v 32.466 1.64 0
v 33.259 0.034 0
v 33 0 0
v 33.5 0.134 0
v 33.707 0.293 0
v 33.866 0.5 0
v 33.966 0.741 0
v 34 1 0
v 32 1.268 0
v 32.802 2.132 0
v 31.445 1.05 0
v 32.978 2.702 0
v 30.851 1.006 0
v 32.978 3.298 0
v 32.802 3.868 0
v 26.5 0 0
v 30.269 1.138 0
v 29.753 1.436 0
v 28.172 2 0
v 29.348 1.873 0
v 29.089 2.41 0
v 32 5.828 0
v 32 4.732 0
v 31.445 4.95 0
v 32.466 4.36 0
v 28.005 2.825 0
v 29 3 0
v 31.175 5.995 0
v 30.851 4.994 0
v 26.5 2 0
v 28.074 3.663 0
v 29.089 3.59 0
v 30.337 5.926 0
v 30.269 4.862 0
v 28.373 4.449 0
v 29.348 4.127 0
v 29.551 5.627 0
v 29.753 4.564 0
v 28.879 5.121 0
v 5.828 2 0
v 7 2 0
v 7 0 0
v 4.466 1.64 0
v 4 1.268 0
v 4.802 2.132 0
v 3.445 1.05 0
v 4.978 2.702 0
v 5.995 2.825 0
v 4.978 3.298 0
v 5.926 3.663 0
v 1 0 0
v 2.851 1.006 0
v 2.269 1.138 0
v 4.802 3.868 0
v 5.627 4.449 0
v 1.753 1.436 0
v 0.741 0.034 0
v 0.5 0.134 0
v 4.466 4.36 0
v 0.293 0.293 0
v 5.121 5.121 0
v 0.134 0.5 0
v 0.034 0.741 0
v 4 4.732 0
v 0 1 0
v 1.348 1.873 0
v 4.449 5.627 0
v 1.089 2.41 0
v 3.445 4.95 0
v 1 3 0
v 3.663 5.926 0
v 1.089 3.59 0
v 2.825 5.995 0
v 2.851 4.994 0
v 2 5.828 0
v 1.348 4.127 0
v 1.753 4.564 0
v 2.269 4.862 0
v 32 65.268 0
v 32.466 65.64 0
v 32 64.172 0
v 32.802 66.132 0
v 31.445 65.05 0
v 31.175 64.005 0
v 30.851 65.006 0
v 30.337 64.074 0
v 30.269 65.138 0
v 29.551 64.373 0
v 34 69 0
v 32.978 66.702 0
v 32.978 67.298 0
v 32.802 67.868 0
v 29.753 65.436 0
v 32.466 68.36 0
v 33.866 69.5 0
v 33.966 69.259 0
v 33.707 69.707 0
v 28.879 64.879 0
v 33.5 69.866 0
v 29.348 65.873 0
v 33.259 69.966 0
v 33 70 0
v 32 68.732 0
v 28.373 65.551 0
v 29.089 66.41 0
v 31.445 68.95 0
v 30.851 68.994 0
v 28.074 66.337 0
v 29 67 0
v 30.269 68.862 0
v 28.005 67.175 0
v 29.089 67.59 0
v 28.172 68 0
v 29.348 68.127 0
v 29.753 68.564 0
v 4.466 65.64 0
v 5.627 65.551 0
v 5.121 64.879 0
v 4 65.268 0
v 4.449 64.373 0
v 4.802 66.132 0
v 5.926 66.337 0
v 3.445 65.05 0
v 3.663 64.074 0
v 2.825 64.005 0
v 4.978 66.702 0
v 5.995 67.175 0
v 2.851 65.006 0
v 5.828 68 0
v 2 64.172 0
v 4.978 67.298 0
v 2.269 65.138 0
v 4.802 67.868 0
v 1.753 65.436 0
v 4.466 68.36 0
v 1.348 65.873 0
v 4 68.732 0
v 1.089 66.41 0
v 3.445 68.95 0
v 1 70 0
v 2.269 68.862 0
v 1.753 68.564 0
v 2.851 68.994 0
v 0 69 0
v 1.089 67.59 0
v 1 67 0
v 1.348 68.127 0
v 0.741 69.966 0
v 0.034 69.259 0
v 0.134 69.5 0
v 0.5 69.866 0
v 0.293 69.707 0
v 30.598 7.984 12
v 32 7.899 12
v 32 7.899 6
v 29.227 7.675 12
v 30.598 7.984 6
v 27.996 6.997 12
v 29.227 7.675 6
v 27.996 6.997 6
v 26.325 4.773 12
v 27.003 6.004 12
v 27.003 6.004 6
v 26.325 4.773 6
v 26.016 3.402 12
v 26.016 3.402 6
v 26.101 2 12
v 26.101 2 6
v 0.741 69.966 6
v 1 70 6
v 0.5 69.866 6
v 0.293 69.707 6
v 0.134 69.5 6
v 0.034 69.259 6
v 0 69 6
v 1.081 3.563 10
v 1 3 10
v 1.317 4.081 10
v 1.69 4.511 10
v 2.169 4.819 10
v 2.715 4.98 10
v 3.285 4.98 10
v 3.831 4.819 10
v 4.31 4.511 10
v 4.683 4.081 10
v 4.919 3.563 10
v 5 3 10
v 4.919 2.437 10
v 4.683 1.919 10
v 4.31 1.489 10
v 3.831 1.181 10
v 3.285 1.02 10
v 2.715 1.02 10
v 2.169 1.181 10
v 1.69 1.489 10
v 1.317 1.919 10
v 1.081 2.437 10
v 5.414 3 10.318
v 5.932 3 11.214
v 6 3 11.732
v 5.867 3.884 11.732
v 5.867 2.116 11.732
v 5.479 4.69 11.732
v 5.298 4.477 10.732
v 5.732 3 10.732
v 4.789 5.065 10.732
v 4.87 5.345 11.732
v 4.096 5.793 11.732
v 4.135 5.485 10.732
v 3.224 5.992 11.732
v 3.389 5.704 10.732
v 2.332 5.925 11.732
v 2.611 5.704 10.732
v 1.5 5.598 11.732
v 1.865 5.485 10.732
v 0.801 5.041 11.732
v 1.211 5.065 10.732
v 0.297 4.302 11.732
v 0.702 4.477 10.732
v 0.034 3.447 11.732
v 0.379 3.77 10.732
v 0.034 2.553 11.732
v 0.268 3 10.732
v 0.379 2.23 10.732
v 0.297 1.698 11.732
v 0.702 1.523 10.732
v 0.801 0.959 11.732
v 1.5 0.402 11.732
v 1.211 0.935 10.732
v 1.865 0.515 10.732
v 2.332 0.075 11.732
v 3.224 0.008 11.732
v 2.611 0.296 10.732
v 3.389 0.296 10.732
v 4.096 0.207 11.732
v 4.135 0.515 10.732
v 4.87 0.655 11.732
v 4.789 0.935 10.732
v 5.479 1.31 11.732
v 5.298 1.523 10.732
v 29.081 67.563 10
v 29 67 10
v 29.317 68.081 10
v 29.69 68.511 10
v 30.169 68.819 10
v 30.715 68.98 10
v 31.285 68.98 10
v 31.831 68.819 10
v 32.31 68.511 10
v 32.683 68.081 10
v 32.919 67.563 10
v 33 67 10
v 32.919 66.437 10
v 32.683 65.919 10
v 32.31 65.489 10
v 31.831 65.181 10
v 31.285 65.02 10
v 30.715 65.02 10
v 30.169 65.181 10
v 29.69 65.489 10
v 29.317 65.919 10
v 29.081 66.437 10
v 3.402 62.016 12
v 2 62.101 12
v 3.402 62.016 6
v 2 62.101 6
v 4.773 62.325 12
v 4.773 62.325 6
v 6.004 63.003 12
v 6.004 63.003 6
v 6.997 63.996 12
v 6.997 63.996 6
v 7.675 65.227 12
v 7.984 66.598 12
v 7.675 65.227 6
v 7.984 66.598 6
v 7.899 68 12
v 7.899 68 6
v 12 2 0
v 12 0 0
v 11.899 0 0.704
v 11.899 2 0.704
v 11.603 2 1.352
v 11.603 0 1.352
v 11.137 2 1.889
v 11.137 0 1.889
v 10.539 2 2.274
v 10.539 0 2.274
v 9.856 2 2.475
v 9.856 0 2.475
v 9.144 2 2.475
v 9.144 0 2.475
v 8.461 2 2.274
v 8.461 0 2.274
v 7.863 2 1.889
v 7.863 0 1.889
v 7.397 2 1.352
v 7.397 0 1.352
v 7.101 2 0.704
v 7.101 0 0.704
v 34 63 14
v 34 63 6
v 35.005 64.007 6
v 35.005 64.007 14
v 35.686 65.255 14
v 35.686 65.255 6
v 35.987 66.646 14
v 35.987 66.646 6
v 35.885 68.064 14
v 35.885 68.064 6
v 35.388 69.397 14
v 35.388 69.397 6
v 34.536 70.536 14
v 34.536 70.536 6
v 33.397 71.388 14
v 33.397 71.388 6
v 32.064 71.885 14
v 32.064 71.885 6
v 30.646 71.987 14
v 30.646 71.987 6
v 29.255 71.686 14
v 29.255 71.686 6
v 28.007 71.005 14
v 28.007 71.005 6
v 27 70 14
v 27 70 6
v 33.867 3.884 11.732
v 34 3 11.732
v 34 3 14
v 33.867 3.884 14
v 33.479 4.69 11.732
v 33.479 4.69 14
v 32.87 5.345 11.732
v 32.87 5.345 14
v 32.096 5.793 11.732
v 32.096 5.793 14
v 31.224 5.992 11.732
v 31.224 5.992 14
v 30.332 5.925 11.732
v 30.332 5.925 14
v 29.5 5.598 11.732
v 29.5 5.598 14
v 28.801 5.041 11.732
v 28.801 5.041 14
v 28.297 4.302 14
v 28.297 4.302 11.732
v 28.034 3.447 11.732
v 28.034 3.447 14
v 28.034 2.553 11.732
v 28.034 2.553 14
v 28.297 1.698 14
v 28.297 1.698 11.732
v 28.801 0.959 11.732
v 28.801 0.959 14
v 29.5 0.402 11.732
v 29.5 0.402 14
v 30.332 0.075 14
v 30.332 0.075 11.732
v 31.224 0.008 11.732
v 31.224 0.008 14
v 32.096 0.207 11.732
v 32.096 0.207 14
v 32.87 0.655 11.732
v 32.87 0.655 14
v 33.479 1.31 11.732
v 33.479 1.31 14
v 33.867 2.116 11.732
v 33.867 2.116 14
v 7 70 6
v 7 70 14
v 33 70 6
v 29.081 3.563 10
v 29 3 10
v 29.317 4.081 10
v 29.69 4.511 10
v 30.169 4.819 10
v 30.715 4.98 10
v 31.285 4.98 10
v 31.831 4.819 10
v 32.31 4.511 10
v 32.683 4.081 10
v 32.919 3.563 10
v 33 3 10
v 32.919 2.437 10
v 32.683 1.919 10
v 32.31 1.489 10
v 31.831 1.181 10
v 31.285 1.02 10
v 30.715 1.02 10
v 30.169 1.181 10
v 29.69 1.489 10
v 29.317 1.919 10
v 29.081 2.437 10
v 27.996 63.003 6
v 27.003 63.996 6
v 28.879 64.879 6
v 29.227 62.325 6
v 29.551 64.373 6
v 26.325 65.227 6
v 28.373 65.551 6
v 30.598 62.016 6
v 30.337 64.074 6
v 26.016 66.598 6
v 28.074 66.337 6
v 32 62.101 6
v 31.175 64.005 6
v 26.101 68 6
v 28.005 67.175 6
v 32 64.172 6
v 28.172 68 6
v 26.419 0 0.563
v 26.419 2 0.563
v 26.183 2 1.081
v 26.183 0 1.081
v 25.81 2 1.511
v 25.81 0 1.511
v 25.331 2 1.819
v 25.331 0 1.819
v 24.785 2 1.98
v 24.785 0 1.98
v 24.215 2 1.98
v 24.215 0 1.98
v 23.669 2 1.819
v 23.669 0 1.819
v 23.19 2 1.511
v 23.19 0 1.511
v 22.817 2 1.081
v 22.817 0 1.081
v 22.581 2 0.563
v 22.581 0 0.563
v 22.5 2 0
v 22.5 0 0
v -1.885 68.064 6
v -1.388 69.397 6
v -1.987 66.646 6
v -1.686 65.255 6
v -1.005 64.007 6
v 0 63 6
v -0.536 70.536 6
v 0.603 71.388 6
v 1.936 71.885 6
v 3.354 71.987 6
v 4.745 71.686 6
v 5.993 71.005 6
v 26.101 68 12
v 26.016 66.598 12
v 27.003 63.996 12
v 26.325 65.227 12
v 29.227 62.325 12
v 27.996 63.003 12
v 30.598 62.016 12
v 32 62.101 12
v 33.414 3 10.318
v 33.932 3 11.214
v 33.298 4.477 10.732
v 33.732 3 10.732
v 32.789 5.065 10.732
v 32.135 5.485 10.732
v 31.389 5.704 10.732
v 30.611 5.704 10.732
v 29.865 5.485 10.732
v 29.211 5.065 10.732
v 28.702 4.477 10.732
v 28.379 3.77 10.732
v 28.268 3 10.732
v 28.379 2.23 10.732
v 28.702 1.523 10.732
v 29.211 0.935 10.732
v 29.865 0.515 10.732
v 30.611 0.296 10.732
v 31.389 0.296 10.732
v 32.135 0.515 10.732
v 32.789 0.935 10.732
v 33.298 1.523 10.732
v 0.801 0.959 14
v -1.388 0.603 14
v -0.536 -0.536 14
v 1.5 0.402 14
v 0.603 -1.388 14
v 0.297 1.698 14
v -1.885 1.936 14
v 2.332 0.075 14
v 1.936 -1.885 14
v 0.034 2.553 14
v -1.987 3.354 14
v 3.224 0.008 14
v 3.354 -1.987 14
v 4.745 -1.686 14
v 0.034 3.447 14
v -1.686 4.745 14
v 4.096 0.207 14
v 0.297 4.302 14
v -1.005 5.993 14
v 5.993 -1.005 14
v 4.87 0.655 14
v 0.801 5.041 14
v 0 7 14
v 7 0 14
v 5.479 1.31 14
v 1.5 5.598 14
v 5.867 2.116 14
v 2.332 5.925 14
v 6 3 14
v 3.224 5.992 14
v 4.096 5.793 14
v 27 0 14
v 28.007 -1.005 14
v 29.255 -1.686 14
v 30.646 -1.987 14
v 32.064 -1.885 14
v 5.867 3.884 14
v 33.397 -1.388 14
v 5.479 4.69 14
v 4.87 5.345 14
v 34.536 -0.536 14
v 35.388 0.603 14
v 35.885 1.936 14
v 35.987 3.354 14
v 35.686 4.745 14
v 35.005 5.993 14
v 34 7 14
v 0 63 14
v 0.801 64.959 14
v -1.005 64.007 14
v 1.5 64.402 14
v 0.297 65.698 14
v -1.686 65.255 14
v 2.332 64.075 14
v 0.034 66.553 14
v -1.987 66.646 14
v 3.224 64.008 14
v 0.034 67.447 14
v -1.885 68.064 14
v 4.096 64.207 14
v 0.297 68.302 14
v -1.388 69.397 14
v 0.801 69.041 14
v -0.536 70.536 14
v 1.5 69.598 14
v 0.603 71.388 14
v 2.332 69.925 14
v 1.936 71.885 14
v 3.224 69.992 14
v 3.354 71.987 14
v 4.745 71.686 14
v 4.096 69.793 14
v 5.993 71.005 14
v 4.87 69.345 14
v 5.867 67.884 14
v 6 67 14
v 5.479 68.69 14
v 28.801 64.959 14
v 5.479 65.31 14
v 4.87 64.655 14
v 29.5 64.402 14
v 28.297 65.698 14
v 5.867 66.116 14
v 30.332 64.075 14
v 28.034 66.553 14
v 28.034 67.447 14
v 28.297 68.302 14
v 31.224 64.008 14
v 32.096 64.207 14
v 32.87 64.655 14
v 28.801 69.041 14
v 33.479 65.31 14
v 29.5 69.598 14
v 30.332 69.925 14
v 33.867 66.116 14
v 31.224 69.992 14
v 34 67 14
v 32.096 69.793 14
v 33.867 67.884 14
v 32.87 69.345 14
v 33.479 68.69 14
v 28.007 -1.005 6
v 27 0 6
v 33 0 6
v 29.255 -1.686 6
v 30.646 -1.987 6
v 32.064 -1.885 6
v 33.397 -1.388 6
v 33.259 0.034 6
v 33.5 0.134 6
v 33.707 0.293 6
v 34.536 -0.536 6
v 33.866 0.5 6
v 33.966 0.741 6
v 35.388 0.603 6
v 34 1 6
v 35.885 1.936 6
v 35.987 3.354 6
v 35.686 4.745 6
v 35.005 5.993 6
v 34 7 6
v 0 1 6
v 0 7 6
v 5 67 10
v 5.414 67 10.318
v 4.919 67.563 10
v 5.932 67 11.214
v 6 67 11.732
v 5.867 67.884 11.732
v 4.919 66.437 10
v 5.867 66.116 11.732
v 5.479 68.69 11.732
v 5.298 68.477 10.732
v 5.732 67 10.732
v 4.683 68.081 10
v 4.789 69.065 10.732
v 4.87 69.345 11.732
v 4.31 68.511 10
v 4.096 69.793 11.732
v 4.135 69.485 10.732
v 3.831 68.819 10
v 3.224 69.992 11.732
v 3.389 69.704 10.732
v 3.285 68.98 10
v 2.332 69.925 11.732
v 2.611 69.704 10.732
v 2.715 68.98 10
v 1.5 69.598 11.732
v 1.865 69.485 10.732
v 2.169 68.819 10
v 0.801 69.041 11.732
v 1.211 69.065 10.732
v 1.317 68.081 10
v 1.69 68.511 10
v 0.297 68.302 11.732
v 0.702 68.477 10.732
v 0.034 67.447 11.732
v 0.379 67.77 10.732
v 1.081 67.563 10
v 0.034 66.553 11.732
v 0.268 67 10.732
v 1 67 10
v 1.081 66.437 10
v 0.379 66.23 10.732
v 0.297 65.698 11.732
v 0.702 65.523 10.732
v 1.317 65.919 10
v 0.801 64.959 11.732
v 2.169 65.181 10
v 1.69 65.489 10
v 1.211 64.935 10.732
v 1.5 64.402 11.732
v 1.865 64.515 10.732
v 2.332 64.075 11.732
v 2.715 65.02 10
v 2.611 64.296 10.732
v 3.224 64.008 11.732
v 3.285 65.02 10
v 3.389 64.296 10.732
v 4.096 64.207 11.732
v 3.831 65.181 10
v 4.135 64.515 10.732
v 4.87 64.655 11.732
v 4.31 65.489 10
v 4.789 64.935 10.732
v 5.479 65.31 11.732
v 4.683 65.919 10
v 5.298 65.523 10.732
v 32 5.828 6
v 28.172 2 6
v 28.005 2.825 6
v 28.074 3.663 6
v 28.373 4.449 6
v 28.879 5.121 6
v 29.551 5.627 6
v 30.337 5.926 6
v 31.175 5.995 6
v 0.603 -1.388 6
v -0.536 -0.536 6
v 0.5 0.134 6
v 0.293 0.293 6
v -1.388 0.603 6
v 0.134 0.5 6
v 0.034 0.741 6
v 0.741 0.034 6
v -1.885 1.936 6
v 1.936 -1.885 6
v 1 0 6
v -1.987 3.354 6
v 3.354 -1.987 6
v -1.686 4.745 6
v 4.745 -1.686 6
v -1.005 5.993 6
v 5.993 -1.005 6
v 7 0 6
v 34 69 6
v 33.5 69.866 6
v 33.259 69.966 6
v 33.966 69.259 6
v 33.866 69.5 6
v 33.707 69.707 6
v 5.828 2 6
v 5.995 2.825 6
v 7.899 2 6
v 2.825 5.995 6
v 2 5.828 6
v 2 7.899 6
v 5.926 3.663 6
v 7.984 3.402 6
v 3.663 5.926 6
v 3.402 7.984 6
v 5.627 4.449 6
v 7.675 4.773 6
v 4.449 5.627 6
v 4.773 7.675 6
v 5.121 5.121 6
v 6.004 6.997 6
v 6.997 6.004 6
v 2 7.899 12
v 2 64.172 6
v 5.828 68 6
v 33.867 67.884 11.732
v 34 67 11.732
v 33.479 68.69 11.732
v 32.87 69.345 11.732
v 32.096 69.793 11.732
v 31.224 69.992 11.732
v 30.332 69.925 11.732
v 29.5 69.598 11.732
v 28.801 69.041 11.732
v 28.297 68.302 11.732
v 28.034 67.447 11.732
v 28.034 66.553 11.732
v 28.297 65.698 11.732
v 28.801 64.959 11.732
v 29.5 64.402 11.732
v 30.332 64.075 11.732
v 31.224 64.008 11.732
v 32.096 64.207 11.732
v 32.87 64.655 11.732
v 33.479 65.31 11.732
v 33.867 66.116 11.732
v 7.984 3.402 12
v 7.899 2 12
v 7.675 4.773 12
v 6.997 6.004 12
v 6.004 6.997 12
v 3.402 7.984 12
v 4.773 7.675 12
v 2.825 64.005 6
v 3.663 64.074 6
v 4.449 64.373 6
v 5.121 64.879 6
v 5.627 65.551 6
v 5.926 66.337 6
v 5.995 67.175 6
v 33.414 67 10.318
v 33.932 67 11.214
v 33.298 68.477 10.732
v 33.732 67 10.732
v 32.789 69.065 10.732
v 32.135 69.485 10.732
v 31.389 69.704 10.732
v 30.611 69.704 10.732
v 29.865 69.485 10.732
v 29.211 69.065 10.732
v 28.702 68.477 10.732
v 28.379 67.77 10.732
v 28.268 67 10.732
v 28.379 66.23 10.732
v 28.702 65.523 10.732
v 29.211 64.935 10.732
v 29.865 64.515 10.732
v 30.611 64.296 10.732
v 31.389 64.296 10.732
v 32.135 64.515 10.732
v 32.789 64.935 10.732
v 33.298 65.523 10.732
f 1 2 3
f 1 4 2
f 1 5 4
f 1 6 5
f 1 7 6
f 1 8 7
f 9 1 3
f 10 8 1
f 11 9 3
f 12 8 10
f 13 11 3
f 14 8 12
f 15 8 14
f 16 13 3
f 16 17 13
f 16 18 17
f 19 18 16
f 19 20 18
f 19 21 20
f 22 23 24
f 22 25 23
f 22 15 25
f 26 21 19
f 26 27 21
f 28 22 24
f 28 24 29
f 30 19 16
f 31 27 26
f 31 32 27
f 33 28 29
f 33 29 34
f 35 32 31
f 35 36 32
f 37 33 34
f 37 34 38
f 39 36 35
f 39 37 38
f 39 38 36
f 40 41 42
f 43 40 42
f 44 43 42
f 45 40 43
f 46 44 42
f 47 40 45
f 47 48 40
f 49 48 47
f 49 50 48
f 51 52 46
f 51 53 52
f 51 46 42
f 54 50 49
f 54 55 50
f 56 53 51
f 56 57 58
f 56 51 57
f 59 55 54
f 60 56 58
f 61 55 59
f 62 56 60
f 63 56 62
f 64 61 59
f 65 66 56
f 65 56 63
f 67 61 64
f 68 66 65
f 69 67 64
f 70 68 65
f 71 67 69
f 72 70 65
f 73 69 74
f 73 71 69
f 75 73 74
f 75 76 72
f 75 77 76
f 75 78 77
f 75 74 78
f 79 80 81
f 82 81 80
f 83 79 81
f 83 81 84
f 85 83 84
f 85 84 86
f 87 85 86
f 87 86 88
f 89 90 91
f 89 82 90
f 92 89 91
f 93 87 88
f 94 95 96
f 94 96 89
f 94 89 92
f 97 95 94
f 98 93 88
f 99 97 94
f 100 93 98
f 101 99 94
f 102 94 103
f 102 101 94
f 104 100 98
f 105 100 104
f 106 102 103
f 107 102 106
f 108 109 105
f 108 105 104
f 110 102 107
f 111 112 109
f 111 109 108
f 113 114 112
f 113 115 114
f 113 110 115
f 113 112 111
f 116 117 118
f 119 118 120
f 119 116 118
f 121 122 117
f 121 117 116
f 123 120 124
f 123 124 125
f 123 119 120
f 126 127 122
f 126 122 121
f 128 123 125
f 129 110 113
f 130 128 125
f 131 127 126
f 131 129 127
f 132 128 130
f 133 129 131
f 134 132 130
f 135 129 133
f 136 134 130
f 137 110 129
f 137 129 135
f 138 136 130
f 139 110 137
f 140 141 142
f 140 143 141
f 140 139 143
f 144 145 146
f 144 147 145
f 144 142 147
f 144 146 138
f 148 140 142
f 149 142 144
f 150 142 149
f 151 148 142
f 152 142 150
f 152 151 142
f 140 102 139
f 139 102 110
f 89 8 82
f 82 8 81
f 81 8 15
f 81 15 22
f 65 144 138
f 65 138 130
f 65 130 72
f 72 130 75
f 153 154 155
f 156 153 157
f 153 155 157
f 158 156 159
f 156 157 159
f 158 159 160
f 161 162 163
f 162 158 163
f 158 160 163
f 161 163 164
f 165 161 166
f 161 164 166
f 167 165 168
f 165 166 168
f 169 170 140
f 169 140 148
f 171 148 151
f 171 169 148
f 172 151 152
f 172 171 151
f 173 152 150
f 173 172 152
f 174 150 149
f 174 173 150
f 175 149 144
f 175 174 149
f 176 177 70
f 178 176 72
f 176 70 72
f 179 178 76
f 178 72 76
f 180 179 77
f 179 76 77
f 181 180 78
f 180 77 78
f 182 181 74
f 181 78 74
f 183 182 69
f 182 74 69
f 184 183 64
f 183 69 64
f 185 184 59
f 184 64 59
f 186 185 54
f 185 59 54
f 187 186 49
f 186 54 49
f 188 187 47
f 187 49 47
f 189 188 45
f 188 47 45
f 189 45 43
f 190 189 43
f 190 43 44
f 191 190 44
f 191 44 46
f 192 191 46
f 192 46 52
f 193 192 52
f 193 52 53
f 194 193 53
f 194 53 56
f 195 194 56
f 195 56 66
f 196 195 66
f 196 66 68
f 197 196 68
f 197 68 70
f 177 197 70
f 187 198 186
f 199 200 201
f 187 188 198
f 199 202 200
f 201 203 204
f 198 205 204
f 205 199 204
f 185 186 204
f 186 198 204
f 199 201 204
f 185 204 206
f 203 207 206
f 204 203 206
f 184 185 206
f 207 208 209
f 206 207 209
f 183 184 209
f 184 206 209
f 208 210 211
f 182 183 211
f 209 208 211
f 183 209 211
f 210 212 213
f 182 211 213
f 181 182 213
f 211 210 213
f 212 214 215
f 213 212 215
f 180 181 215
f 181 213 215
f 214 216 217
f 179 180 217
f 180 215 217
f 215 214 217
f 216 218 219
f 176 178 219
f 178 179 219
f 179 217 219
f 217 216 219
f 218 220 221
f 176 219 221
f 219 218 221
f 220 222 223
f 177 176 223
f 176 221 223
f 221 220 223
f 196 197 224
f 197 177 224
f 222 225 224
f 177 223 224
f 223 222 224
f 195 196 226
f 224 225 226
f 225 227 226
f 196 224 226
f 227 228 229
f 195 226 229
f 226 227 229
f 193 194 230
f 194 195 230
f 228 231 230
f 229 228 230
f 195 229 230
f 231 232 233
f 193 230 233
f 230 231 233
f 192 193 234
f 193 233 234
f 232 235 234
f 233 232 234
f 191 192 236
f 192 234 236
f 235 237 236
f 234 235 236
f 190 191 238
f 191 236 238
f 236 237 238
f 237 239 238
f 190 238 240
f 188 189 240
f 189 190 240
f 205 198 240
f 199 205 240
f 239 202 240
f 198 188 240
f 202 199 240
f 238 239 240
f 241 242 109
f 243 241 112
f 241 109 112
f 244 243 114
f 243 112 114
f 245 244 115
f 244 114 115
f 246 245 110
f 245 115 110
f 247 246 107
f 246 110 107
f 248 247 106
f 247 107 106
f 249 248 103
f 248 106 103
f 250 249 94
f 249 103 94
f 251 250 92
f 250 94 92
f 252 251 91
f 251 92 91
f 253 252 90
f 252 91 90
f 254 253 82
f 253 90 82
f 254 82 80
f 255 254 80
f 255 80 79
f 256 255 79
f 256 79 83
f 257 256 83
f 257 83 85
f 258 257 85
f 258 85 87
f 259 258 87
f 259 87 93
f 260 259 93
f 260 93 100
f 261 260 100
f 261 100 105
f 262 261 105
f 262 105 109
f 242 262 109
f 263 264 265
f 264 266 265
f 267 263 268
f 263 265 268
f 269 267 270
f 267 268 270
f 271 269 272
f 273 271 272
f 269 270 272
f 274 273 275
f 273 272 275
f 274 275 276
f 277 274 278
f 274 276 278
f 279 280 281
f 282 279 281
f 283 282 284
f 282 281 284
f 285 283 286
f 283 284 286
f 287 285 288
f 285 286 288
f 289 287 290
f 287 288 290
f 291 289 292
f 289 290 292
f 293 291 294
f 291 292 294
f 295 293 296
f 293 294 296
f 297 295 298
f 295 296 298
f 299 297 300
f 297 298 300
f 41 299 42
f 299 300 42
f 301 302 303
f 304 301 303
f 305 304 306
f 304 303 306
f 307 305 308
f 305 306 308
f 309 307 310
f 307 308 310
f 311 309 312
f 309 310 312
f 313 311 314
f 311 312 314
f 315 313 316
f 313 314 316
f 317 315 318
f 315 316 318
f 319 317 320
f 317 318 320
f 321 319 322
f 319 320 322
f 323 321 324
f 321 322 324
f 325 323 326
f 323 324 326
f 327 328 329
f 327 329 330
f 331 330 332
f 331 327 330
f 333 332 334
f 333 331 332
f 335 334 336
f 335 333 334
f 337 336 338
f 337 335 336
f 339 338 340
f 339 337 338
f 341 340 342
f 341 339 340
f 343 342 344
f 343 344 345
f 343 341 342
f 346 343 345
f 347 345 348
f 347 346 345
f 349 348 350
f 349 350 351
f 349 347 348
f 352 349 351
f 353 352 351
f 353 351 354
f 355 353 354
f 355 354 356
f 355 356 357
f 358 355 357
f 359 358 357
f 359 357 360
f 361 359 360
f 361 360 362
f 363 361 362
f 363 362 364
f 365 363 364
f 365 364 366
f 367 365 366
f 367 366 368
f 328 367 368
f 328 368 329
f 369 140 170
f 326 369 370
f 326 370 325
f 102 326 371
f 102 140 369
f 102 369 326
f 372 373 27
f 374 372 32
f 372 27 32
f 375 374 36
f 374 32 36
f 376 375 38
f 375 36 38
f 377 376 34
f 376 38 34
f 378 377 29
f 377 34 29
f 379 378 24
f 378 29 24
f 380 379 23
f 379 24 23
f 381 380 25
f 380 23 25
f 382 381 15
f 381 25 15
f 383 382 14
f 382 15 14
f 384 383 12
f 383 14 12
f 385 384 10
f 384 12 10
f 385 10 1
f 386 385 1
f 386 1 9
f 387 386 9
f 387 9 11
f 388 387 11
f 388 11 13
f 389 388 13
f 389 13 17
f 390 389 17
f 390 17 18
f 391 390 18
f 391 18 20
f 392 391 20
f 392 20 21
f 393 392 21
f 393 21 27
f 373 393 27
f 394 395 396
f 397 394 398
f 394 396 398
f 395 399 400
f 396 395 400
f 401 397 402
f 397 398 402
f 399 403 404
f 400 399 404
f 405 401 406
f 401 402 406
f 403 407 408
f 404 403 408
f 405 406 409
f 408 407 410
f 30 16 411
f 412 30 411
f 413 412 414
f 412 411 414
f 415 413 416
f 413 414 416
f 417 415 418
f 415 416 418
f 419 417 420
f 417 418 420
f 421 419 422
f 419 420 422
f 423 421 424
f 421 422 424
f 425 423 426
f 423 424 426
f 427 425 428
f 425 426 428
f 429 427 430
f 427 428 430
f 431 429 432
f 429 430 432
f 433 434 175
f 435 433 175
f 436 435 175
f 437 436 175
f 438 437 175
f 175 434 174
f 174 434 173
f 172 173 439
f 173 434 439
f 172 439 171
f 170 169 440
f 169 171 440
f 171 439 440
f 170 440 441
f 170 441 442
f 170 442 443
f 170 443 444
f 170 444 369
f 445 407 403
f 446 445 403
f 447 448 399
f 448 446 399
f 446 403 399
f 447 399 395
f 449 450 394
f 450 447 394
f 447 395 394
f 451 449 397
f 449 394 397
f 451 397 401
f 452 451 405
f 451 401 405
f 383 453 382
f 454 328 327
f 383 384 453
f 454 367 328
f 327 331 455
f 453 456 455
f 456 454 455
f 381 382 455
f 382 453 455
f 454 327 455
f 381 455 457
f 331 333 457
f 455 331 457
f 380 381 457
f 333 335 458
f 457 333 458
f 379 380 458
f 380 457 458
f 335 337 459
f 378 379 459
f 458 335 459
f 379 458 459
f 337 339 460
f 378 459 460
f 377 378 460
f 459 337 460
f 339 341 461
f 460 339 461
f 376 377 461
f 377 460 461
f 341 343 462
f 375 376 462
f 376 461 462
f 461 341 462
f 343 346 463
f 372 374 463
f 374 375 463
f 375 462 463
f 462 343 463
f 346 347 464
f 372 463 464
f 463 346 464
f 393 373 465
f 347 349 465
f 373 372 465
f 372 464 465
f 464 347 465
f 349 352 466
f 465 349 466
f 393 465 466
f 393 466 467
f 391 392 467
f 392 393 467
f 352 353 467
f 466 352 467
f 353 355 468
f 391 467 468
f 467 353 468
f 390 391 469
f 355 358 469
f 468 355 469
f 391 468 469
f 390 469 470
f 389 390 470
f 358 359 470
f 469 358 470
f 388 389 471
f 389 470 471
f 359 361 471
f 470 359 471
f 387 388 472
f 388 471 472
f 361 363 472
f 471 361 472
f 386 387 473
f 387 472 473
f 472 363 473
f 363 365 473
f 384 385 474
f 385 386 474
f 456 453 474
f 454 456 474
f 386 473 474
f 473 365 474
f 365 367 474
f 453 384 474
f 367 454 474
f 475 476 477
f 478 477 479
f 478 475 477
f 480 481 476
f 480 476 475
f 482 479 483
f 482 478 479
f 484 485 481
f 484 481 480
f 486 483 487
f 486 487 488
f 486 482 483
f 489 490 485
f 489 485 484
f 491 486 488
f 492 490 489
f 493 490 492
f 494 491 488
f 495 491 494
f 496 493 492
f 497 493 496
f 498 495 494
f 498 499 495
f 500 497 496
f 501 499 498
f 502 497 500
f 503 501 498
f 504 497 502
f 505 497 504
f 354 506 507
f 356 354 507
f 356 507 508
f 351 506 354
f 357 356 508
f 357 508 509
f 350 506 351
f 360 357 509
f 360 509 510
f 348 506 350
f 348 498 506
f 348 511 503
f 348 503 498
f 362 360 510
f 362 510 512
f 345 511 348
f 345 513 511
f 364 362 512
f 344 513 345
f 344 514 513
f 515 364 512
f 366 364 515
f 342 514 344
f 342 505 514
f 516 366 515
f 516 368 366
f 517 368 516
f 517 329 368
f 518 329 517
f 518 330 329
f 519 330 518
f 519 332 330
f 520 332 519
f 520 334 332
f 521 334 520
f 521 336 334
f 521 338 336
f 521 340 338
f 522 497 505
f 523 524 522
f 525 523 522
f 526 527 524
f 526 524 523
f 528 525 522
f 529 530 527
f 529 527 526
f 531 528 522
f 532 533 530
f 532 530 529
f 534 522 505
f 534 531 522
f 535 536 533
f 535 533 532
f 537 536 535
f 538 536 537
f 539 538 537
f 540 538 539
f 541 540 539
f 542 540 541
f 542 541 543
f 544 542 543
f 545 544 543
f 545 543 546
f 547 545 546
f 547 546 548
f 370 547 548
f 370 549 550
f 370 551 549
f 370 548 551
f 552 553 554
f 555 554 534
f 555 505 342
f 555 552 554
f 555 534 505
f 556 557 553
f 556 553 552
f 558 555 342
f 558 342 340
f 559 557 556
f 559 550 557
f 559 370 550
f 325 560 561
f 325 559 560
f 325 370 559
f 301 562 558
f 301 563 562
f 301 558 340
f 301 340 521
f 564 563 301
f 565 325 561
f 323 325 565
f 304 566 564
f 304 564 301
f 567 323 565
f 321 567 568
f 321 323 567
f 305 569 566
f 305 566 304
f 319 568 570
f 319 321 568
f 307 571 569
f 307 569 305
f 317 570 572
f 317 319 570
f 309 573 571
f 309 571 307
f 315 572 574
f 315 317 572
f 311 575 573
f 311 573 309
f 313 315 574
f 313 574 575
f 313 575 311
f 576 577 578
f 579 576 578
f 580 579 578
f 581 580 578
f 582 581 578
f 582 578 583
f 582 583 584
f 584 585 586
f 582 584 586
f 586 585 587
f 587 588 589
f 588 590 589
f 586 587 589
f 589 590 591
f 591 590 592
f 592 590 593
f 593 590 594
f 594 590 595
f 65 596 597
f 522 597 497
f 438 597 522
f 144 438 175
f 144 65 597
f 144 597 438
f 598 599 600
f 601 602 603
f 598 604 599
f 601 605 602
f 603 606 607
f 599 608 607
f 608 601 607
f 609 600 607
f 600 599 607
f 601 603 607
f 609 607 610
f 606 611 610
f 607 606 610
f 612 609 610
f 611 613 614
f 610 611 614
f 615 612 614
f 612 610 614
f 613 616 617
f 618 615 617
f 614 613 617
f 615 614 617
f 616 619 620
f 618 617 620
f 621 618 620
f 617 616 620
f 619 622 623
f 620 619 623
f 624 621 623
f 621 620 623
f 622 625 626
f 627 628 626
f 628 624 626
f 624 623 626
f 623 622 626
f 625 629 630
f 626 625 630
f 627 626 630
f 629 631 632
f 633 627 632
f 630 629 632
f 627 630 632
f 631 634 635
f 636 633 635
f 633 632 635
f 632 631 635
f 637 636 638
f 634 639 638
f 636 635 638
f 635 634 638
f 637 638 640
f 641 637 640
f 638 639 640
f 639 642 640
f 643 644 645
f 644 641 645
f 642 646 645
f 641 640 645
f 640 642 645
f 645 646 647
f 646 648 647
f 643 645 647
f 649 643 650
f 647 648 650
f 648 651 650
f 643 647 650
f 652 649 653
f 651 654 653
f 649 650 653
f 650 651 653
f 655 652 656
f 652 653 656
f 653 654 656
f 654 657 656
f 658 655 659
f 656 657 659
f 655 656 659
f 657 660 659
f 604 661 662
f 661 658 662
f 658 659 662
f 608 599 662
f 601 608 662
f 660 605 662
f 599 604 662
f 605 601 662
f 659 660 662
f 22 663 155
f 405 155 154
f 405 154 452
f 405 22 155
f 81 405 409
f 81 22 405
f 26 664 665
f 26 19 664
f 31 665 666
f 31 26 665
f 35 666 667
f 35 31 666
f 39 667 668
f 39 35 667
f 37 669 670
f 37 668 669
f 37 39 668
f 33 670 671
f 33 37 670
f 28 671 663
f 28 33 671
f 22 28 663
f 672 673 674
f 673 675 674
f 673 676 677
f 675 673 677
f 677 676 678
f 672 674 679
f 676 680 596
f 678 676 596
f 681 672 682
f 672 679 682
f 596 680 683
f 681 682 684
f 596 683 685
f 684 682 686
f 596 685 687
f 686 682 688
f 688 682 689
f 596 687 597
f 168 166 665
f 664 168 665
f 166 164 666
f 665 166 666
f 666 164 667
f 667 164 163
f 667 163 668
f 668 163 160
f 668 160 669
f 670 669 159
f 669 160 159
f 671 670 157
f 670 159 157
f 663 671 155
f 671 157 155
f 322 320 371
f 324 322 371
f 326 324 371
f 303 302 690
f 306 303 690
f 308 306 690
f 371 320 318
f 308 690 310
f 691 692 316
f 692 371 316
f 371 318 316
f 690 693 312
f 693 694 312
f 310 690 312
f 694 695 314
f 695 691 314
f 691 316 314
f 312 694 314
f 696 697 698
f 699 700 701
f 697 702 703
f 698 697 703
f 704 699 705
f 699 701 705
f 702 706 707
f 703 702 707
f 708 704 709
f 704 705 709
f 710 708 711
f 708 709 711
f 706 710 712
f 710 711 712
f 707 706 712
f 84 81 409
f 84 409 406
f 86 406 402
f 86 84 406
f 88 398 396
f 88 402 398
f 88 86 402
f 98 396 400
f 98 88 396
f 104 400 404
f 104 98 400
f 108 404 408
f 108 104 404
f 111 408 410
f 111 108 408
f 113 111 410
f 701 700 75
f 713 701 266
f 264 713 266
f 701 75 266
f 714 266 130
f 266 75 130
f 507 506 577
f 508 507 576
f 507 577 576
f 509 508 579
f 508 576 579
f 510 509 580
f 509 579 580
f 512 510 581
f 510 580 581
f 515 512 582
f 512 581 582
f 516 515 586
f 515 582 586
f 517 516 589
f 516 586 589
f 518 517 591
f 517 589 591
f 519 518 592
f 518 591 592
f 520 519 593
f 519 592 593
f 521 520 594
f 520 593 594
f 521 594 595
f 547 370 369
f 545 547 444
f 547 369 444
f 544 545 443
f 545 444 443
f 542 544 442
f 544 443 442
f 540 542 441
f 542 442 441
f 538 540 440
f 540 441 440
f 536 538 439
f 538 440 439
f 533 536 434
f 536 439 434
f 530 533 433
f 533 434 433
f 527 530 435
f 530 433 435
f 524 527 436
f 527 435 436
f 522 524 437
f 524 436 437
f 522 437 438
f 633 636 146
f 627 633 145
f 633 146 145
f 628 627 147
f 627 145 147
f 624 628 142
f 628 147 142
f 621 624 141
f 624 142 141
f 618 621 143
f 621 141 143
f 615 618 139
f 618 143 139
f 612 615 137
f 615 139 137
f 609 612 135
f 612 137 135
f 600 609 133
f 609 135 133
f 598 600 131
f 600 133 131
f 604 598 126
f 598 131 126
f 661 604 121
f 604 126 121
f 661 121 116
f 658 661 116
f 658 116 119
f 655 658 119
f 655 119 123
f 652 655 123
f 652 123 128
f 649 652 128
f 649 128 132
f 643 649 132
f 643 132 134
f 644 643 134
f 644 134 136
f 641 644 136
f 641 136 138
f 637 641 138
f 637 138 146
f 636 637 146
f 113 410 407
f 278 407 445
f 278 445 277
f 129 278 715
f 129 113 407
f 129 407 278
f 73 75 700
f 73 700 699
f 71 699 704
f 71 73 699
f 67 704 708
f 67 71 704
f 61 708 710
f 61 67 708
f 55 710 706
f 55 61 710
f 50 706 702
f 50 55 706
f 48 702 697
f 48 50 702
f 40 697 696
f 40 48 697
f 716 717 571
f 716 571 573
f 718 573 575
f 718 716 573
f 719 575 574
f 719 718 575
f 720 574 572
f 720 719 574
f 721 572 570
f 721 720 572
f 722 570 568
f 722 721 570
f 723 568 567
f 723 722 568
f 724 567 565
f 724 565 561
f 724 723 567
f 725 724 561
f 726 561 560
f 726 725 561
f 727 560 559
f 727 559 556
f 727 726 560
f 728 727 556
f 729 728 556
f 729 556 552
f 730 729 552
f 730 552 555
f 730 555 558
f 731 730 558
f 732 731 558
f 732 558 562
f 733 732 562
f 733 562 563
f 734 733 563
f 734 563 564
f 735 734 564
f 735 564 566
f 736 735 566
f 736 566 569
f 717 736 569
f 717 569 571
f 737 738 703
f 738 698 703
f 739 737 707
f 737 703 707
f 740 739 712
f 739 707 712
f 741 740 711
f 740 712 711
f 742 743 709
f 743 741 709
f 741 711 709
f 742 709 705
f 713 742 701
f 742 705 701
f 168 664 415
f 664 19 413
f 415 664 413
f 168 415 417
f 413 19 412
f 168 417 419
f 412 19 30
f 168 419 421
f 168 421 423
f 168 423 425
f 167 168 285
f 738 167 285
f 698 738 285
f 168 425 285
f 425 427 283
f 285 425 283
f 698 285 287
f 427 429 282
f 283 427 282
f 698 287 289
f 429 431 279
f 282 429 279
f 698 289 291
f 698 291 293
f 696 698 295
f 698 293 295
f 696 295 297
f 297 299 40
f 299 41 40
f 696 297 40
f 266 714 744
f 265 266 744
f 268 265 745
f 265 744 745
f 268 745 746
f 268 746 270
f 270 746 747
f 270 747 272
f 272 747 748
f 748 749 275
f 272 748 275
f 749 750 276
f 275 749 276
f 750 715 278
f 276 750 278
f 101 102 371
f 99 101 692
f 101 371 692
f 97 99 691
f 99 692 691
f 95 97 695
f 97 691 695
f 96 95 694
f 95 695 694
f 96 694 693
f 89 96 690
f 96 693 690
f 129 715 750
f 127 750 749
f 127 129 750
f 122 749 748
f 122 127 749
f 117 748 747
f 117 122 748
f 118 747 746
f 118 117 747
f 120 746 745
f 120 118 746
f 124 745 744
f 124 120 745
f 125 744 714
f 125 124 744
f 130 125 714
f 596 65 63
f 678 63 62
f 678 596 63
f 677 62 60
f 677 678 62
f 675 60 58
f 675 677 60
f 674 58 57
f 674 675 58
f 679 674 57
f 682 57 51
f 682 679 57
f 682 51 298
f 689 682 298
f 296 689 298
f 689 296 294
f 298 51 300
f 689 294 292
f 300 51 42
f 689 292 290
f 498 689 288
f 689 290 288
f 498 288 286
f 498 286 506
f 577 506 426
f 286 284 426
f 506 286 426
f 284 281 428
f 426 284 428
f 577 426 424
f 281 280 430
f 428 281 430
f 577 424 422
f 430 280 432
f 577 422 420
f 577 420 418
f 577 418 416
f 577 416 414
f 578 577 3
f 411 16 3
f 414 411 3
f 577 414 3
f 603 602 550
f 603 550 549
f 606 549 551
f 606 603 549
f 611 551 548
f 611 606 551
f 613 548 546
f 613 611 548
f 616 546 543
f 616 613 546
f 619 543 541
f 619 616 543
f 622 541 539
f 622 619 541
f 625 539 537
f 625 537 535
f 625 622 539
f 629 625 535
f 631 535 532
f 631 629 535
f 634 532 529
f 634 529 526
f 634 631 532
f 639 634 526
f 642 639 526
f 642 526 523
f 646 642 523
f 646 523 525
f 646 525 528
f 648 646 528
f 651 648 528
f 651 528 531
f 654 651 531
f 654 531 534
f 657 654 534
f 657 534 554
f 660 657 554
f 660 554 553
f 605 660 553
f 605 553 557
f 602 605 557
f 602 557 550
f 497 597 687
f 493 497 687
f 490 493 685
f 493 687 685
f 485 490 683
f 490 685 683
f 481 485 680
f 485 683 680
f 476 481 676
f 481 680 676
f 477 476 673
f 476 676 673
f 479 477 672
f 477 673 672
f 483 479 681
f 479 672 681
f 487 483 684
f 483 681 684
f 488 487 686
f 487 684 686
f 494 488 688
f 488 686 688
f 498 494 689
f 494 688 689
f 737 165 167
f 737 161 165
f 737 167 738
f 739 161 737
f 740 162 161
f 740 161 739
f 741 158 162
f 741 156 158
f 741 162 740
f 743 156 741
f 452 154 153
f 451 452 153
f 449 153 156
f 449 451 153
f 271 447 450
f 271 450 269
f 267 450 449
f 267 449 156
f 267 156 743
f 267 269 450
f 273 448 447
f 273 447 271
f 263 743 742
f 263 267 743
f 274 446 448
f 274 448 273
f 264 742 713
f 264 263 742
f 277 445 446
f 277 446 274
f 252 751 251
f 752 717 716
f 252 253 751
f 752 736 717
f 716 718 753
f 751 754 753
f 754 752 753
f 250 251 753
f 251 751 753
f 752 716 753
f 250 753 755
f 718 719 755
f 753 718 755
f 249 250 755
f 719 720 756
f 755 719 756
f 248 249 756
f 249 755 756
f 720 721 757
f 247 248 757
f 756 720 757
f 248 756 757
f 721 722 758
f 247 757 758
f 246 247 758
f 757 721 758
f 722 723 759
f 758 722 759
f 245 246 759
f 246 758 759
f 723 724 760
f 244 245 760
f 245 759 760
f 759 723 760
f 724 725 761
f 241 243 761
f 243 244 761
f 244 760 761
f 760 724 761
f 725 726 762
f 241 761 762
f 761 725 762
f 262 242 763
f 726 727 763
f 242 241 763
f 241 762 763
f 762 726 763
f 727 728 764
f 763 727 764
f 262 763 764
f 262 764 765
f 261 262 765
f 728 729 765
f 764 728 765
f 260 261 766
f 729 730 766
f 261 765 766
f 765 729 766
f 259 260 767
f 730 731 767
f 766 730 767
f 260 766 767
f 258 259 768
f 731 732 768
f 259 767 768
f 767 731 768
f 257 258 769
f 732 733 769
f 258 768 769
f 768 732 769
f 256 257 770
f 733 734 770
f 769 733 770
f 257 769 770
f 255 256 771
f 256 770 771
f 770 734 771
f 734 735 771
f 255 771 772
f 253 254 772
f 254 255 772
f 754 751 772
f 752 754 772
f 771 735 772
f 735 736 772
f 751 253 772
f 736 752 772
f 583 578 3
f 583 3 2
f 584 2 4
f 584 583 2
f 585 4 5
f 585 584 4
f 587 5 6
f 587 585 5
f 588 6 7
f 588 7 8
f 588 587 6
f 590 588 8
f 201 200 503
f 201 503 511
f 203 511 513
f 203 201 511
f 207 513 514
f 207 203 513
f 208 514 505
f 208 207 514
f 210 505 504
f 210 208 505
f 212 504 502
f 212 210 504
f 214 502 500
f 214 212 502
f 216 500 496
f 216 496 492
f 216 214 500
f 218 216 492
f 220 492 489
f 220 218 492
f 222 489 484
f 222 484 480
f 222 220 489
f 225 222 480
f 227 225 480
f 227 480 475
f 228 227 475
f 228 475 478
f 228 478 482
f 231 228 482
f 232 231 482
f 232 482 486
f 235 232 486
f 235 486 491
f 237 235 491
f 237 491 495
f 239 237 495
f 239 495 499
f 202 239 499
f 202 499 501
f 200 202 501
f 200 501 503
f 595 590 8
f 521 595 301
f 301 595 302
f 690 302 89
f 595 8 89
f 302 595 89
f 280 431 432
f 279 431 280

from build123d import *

# Parameters (mm, degrees)
SKETCH1_W           = 34
SKETCH1_H           = 70
BOSS_EXTRUDE1_DEPTH = 14
SKETCH2_W           = 30
SKETCH2_H           = 66
CUT_EXTRUDE1_DEPTH  = 12
SKETCH3_R           = 3
BOSS_EXTRUDE2_DEPTH = 12
SKETCH4_R           = 2
CUT_EXTRUDE2_DEPTH  = 80.069589603
CUT_EXTRUDE4_REACH  = 81.07
SKETCH6_R           = 2.5
SKETCH6_R_2         = 2
FILLET1_R           = 1
BOSS_EXTRUDE3_START = -8
SKETCH7_R           = 5
SKETCH7_R_2         = 3
BOSS_EXTRUDE3_DEPTH = 8
CUT_EXTRUDE7_START  = -4
SKETCH8_R           = 3
CUT_EXTRUDE7_DEPTH  = 4
FILLET2_R           = 2


with BuildPart() as part:
    # Sketch1 → Boss-Extrude1 (new body)
    with BuildSketch(Plane.XY):
        with Locations((17, 35)):
            Rectangle(SKETCH1_W, SKETCH1_H)
    extrude(amount=BOSS_EXTRUDE1_DEPTH)

    # Sketch2 → Cut-Extrude1 (cut)
    with BuildSketch(Plane(origin=(0, 0, 0), x_dir=(-1, 0, 0), z_dir=(0, 0, -1))):
        with Locations((-17, 35)):
            Rectangle(SKETCH2_W, SKETCH2_H)
    extrude(amount=-CUT_EXTRUDE1_DEPTH, mode=Mode.SUBTRACT)

    # Sketch3 → Boss-Extrude2 (add)
    with BuildSketch(Plane(origin=(0, 0, 0), x_dir=(-1, 0, 0), z_dir=(0, 0, -1))):
        with Locations((-31, 67)):
            Circle(SKETCH3_R)
        with Locations((-3, 67)):
            Circle(SKETCH3_R)
        with Locations((-3, 3)):
            Circle(SKETCH3_R)
        with Locations((-31, 3)):
            Circle(SKETCH3_R)
    extrude(amount=-BOSS_EXTRUDE2_DEPTH)

    # Sketch4 → Cut-Extrude2 (cut, through all)
    with BuildSketch(Plane(origin=(0, 0, 0), x_dir=(-1, 0, 0), z_dir=(0, 0, -1))):
        with Locations((-3, 67)):
            Circle(SKETCH4_R)
        with Locations((-31, 67)):
            Circle(SKETCH4_R)
        with Locations((-3, 3)):
            Circle(SKETCH4_R)
        with Locations((-31, 3)):
            Circle(SKETCH4_R)
    extrude(amount=-CUT_EXTRUDE2_DEPTH, mode=Mode.SUBTRACT)

    # Sketch6 → Cut-Extrude4 (cut, up to next)
    with BuildSketch(Plane.XZ, mode=Mode.PRIVATE) as cut_extrude4_sk1:
        with Locations((9.5, 0)):
            Circle(SKETCH6_R)
    cut_extrude4_tool1 = extrude(cut_extrude4_sk1.sketch, amount=-CUT_EXTRUDE4_REACH, mode=Mode.PRIVATE) & part.part
    # Sketch6 → Cut-Extrude4 (cut, up to next)
    with BuildSketch(Plane.XZ, mode=Mode.PRIVATE) as cut_extrude4_sk2:
        with Locations((24.5, 0)):
            Circle(SKETCH6_R_2)
    cut_extrude4_tool2 = extrude(cut_extrude4_sk2.sketch, amount=-CUT_EXTRUDE4_REACH, mode=Mode.PRIVATE) & part.part
    add(cut_extrude4_tool1.solids().sort_by_distance((9.5, 0, 0))[0], mode=Mode.SUBTRACT)
    add(cut_extrude4_tool2.solids().sort_by_distance((24.5, 0, 0))[0], mode=Mode.SUBTRACT)

    # Fillet1
    fillet1_edges = [part.edges().sort_by_distance(p)[0] for p in [
        (0, 70, 7),
        (34, 70, 7),
        (34, 0, 7),
        (0, 0, 7),
    ]]
    fillet(fillet1_edges, radius=FILLET1_R)

    # Sketch7 → Boss-Extrude3 (add)
    # profile 1 of 4: a face of its own
    with BuildSketch(Plane.XY.offset(14).offset(BOSS_EXTRUDE3_START)):
        with Locations((31, 67)):
            Circle(SKETCH7_R)
        with Locations((31, 67)):
            Circle(SKETCH7_R_2, mode=Mode.SUBTRACT)
    # profile 2 of 4: a face of its own
    with BuildSketch(Plane.XY.offset(14).offset(BOSS_EXTRUDE3_START)):
        with Locations((3, 67)):
            Circle(SKETCH7_R)
        with Locations((3, 67)):
            Circle(SKETCH7_R_2, mode=Mode.SUBTRACT)
    # profile 3 of 4: a face of its own
    with BuildSketch(Plane.XY.offset(14).offset(BOSS_EXTRUDE3_START)):
        with Locations((31, 3)):
            Circle(SKETCH7_R)
        with Locations((31, 3)):
            Circle(SKETCH7_R_2, mode=Mode.SUBTRACT)
    # profile 4 of 4: a face of its own
    with BuildSketch(Plane.XY.offset(14).offset(BOSS_EXTRUDE3_START)):
        with Locations((3, 3)):
            Circle(SKETCH7_R)
        with Locations((3, 3)):
            Circle(SKETCH7_R_2, mode=Mode.SUBTRACT)
    extrude(amount=BOSS_EXTRUDE3_DEPTH)

    # Sketch8 → Cut-Extrude7 (cut)
    with BuildSketch(Plane.XY.offset(14).offset(CUT_EXTRUDE7_START)):
        with Locations((3, 3)):
            Circle(SKETCH8_R)
        with Locations((31, 3)):
            Circle(SKETCH8_R)
        with Locations((31, 67)):
            Circle(SKETCH8_R)
        with Locations((3, 67)):
            Circle(SKETCH8_R)
    extrude(amount=CUT_EXTRUDE7_DEPTH, mode=Mode.SUBTRACT)

    # Fillet2
    # the kernel refuses this fillet: 2 mm, written as the material it adds along each edge
    with BuildSketch(Plane(origin=(3, 67, 10), x_dir=(1, 0, 0), z_dir=(0, -1, 0))) as fillet2_piece_1_section:
        with BuildLine():
            CenterArc((1, 1.732050808), FILLET2_R, 300, 60)
            Line((2, 0), (2.02, -0.034641016))
            ThreePointArc((2.02, -0.034641016), (2.5, -0.04), (3, -0.04))
            Line((3, -0.04), (3.04, 0))
            Line((3.04, 0), (3.04, 1.732050808))
            Line((3.04, 1.732050808), (3, 1.732050808))
        make_face()
    fillet2_piece_1 = revolve(axis=Axis((3, 67, 10), (0, 0, 1)), mode=Mode.PRIVATE)
    fillet2_piece_1 = fillet2_piece_1 - Plane(origin=(3, 67, 10.721085361), x_dir=(-1, 0, 0), z_dir=(0, 0, -1)) * Cylinder(2, 13, mode=Mode.PRIVATE)
    add(fillet2_piece_1)
    with BuildSketch(Plane(origin=(31, 67, 10), x_dir=(1, 0, 0), z_dir=(0, -1, 0))) as fillet2_piece_2_section:
        with BuildLine():
            CenterArc((1, 1.732050808), FILLET2_R, 300, 60)
            Line((2, 0), (2.02, -0.034641016))
            ThreePointArc((2.02, -0.034641016), (2.5, -0.04), (3, -0.04))
            Line((3, -0.04), (3.04, 0))
            Line((3.04, 0), (3.04, 1.732050808))
            Line((3.04, 1.732050808), (3, 1.732050808))
        make_face()
    fillet2_piece_2 = revolve(axis=Axis((31, 67, 10), (0, 0, 1)), mode=Mode.PRIVATE)
    fillet2_piece_2 = fillet2_piece_2 - Plane(origin=(31, 67, 10.721085361), x_dir=(-1, 0, 0), z_dir=(0, 0, -1)) * Cylinder(2, 13, mode=Mode.PRIVATE)
    add(fillet2_piece_2)
    with BuildSketch(Plane(origin=(31, 3, 10), x_dir=(1, 0, 0), z_dir=(0, -1, 0))) as fillet2_piece_3_section:
        with BuildLine():
            CenterArc((1, 1.732050808), FILLET2_R, 300, 60)
            Line((2, 0), (2.02, -0.034641016))
            ThreePointArc((2.02, -0.034641016), (2.5, -0.04), (3, -0.04))
            Line((3, -0.04), (3.04, 0))
            Line((3.04, 0), (3.04, 1.732050808))
            Line((3.04, 1.732050808), (3, 1.732050808))
        make_face()
    fillet2_piece_3 = revolve(axis=Axis((31, 3, 10), (0, 0, 1)), mode=Mode.PRIVATE)
    fillet2_piece_3 = fillet2_piece_3 - Plane(origin=(31, 3, 10.721085361), x_dir=(-1, 0, 0), z_dir=(0, 0, -1)) * Cylinder(2, 13, mode=Mode.PRIVATE)
    add(fillet2_piece_3)
    with BuildSketch(Plane(origin=(3, 3, 10), x_dir=(1, 0, 0), z_dir=(0, -1, 0))) as fillet2_piece_4_section:
        with BuildLine():
            CenterArc((1, 1.732050808), FILLET2_R, 300, 60)
            Line((2, 0), (2.02, -0.034641016))
            ThreePointArc((2.02, -0.034641016), (2.5, -0.04), (3, -0.04))
            Line((3, -0.04), (3.04, 0))
            Line((3.04, 0), (3.04, 1.732050808))
            Line((3.04, 1.732050808), (3, 1.732050808))
        make_face()
    fillet2_piece_4 = revolve(axis=Axis((3, 3, 10), (0, 0, 1)), mode=Mode.PRIVATE)
    fillet2_piece_4 = fillet2_piece_4 - Plane(origin=(3, 3, 10.721085361), x_dir=(-1, 0, 0), z_dir=(0, 0, -1)) * Cylinder(2, 13, mode=Mode.PRIVATE)
    add(fillet2_piece_4)


solid = part.part
